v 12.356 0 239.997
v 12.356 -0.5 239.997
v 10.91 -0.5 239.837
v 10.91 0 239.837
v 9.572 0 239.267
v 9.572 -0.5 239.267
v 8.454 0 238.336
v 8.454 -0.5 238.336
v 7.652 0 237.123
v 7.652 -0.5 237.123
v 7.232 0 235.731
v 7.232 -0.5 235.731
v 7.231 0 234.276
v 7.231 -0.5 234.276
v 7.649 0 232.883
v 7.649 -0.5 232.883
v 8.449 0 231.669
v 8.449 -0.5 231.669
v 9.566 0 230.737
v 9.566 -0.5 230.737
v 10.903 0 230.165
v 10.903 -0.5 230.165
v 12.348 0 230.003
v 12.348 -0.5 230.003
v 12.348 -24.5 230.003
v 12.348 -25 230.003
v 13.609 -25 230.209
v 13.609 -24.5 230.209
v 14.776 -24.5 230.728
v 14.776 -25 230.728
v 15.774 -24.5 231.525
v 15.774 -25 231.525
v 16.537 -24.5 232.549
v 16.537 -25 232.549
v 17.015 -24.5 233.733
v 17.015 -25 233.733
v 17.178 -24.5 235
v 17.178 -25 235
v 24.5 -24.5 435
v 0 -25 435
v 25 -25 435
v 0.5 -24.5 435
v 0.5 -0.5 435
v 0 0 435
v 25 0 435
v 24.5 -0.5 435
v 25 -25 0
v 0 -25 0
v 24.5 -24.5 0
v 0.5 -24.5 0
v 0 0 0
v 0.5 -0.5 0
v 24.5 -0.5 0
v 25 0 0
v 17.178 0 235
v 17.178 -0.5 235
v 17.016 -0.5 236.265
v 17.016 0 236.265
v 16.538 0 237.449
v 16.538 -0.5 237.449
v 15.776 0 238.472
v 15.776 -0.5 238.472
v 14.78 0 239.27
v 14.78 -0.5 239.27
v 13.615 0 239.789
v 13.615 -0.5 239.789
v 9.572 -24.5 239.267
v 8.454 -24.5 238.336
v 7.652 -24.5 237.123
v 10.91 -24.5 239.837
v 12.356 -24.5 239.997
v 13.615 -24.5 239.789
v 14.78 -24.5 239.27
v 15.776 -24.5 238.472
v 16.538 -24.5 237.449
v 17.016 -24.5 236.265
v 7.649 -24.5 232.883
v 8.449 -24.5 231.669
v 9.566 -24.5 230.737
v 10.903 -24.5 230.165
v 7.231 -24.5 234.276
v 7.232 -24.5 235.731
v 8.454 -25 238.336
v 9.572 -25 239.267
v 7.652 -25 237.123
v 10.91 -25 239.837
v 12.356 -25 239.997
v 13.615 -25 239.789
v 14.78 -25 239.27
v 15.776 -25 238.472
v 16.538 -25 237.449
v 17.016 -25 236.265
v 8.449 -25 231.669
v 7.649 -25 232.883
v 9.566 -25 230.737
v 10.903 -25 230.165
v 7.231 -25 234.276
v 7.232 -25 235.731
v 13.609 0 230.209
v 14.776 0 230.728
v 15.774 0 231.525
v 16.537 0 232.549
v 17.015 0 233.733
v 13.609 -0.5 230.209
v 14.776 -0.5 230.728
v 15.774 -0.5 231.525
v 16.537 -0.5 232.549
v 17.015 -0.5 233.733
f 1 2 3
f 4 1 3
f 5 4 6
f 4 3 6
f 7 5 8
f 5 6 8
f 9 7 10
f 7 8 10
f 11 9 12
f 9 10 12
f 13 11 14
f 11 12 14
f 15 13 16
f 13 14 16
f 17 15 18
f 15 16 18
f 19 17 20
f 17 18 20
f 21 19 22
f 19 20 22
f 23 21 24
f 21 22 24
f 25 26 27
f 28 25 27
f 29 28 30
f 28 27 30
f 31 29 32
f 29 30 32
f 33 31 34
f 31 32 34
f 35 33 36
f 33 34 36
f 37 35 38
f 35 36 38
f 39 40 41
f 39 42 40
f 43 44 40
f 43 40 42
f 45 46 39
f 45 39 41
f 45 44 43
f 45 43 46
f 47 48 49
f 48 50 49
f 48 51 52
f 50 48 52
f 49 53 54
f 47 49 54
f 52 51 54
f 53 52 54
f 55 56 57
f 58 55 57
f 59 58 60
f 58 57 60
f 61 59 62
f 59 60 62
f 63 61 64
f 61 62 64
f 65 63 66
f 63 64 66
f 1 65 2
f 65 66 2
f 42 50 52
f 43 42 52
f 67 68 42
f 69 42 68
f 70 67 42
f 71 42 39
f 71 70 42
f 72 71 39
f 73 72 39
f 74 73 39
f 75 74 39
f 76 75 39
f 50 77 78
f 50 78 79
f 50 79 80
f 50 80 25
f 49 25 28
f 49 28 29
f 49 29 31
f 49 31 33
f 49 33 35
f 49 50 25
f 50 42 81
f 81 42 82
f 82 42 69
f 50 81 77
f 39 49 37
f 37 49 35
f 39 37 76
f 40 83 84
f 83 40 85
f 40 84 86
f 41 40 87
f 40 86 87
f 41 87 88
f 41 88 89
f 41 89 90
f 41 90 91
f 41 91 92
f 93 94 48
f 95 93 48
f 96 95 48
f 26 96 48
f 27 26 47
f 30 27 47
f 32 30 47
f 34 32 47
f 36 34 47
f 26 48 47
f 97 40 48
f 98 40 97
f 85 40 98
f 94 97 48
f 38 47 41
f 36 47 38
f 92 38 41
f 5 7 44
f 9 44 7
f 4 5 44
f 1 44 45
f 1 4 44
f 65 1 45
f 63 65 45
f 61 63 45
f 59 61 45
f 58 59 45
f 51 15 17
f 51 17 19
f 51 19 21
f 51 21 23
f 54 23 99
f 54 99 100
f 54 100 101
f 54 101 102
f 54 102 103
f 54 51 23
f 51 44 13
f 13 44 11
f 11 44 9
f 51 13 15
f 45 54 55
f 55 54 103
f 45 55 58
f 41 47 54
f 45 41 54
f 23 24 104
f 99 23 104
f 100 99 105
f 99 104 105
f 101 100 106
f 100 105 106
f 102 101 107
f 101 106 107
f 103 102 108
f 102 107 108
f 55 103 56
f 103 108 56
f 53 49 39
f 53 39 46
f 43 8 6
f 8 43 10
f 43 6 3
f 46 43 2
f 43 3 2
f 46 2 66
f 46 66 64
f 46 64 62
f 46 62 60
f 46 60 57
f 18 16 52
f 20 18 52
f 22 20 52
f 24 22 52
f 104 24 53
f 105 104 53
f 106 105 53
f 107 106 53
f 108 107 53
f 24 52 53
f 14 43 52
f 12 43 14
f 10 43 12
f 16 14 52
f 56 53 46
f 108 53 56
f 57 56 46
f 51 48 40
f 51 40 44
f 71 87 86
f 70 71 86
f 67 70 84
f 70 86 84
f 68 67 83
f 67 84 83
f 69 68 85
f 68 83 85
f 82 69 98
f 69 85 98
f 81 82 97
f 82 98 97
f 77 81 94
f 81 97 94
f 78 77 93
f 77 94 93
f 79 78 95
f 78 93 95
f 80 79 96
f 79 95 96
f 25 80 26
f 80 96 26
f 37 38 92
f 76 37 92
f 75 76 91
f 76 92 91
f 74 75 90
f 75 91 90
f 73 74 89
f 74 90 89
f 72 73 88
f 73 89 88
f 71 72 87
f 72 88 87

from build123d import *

# Parameters (mm, degrees)
F0_W     = 25
F0_H     = 25
F0_W_2   = 24
F0_H_2   = 24
F1_DEPTH = 435
F3_DEPTH = 25.001


with BuildPart() as f1:
    # F0 (on Top) → F1 (new body)
    with BuildSketch(Plane.XY):
        with Locations((12.5, -12.5)):
            Rectangle(F0_W, F0_H)
        with Locations((12.5, -12.5)):
            Rectangle(F0_W_2, F0_H_2, mode=Mode.SUBTRACT)
    extrude(amount=F1_DEPTH)

    # F2 (on face) → F3 (cut, through all)
    with BuildSketch(Plane.XZ.offset(25)):
        with BuildLine():
            ThreePointArc((12.348425, 230.002893), (15.773518, 231.525113), (17.17836, 235))
            ThreePointArc((17.17836, 235), (15.776087, 238.472228), (12.355814, 239.99685))
            Line((12.355814, 239.99685), (12.348425, 230.002893))
        make_face()
        with BuildLine():
            Line((12.348425, 230.002893), (12.355814, 239.99685))
            ThreePointArc((12.355814, 239.99685), (7.178362, 235.003697), (12.348425, 230.002893))
        make_face()
    extrude(amount=-F3_DEPTH, mode=Mode.SUBTRACT)


solid = f1.part
